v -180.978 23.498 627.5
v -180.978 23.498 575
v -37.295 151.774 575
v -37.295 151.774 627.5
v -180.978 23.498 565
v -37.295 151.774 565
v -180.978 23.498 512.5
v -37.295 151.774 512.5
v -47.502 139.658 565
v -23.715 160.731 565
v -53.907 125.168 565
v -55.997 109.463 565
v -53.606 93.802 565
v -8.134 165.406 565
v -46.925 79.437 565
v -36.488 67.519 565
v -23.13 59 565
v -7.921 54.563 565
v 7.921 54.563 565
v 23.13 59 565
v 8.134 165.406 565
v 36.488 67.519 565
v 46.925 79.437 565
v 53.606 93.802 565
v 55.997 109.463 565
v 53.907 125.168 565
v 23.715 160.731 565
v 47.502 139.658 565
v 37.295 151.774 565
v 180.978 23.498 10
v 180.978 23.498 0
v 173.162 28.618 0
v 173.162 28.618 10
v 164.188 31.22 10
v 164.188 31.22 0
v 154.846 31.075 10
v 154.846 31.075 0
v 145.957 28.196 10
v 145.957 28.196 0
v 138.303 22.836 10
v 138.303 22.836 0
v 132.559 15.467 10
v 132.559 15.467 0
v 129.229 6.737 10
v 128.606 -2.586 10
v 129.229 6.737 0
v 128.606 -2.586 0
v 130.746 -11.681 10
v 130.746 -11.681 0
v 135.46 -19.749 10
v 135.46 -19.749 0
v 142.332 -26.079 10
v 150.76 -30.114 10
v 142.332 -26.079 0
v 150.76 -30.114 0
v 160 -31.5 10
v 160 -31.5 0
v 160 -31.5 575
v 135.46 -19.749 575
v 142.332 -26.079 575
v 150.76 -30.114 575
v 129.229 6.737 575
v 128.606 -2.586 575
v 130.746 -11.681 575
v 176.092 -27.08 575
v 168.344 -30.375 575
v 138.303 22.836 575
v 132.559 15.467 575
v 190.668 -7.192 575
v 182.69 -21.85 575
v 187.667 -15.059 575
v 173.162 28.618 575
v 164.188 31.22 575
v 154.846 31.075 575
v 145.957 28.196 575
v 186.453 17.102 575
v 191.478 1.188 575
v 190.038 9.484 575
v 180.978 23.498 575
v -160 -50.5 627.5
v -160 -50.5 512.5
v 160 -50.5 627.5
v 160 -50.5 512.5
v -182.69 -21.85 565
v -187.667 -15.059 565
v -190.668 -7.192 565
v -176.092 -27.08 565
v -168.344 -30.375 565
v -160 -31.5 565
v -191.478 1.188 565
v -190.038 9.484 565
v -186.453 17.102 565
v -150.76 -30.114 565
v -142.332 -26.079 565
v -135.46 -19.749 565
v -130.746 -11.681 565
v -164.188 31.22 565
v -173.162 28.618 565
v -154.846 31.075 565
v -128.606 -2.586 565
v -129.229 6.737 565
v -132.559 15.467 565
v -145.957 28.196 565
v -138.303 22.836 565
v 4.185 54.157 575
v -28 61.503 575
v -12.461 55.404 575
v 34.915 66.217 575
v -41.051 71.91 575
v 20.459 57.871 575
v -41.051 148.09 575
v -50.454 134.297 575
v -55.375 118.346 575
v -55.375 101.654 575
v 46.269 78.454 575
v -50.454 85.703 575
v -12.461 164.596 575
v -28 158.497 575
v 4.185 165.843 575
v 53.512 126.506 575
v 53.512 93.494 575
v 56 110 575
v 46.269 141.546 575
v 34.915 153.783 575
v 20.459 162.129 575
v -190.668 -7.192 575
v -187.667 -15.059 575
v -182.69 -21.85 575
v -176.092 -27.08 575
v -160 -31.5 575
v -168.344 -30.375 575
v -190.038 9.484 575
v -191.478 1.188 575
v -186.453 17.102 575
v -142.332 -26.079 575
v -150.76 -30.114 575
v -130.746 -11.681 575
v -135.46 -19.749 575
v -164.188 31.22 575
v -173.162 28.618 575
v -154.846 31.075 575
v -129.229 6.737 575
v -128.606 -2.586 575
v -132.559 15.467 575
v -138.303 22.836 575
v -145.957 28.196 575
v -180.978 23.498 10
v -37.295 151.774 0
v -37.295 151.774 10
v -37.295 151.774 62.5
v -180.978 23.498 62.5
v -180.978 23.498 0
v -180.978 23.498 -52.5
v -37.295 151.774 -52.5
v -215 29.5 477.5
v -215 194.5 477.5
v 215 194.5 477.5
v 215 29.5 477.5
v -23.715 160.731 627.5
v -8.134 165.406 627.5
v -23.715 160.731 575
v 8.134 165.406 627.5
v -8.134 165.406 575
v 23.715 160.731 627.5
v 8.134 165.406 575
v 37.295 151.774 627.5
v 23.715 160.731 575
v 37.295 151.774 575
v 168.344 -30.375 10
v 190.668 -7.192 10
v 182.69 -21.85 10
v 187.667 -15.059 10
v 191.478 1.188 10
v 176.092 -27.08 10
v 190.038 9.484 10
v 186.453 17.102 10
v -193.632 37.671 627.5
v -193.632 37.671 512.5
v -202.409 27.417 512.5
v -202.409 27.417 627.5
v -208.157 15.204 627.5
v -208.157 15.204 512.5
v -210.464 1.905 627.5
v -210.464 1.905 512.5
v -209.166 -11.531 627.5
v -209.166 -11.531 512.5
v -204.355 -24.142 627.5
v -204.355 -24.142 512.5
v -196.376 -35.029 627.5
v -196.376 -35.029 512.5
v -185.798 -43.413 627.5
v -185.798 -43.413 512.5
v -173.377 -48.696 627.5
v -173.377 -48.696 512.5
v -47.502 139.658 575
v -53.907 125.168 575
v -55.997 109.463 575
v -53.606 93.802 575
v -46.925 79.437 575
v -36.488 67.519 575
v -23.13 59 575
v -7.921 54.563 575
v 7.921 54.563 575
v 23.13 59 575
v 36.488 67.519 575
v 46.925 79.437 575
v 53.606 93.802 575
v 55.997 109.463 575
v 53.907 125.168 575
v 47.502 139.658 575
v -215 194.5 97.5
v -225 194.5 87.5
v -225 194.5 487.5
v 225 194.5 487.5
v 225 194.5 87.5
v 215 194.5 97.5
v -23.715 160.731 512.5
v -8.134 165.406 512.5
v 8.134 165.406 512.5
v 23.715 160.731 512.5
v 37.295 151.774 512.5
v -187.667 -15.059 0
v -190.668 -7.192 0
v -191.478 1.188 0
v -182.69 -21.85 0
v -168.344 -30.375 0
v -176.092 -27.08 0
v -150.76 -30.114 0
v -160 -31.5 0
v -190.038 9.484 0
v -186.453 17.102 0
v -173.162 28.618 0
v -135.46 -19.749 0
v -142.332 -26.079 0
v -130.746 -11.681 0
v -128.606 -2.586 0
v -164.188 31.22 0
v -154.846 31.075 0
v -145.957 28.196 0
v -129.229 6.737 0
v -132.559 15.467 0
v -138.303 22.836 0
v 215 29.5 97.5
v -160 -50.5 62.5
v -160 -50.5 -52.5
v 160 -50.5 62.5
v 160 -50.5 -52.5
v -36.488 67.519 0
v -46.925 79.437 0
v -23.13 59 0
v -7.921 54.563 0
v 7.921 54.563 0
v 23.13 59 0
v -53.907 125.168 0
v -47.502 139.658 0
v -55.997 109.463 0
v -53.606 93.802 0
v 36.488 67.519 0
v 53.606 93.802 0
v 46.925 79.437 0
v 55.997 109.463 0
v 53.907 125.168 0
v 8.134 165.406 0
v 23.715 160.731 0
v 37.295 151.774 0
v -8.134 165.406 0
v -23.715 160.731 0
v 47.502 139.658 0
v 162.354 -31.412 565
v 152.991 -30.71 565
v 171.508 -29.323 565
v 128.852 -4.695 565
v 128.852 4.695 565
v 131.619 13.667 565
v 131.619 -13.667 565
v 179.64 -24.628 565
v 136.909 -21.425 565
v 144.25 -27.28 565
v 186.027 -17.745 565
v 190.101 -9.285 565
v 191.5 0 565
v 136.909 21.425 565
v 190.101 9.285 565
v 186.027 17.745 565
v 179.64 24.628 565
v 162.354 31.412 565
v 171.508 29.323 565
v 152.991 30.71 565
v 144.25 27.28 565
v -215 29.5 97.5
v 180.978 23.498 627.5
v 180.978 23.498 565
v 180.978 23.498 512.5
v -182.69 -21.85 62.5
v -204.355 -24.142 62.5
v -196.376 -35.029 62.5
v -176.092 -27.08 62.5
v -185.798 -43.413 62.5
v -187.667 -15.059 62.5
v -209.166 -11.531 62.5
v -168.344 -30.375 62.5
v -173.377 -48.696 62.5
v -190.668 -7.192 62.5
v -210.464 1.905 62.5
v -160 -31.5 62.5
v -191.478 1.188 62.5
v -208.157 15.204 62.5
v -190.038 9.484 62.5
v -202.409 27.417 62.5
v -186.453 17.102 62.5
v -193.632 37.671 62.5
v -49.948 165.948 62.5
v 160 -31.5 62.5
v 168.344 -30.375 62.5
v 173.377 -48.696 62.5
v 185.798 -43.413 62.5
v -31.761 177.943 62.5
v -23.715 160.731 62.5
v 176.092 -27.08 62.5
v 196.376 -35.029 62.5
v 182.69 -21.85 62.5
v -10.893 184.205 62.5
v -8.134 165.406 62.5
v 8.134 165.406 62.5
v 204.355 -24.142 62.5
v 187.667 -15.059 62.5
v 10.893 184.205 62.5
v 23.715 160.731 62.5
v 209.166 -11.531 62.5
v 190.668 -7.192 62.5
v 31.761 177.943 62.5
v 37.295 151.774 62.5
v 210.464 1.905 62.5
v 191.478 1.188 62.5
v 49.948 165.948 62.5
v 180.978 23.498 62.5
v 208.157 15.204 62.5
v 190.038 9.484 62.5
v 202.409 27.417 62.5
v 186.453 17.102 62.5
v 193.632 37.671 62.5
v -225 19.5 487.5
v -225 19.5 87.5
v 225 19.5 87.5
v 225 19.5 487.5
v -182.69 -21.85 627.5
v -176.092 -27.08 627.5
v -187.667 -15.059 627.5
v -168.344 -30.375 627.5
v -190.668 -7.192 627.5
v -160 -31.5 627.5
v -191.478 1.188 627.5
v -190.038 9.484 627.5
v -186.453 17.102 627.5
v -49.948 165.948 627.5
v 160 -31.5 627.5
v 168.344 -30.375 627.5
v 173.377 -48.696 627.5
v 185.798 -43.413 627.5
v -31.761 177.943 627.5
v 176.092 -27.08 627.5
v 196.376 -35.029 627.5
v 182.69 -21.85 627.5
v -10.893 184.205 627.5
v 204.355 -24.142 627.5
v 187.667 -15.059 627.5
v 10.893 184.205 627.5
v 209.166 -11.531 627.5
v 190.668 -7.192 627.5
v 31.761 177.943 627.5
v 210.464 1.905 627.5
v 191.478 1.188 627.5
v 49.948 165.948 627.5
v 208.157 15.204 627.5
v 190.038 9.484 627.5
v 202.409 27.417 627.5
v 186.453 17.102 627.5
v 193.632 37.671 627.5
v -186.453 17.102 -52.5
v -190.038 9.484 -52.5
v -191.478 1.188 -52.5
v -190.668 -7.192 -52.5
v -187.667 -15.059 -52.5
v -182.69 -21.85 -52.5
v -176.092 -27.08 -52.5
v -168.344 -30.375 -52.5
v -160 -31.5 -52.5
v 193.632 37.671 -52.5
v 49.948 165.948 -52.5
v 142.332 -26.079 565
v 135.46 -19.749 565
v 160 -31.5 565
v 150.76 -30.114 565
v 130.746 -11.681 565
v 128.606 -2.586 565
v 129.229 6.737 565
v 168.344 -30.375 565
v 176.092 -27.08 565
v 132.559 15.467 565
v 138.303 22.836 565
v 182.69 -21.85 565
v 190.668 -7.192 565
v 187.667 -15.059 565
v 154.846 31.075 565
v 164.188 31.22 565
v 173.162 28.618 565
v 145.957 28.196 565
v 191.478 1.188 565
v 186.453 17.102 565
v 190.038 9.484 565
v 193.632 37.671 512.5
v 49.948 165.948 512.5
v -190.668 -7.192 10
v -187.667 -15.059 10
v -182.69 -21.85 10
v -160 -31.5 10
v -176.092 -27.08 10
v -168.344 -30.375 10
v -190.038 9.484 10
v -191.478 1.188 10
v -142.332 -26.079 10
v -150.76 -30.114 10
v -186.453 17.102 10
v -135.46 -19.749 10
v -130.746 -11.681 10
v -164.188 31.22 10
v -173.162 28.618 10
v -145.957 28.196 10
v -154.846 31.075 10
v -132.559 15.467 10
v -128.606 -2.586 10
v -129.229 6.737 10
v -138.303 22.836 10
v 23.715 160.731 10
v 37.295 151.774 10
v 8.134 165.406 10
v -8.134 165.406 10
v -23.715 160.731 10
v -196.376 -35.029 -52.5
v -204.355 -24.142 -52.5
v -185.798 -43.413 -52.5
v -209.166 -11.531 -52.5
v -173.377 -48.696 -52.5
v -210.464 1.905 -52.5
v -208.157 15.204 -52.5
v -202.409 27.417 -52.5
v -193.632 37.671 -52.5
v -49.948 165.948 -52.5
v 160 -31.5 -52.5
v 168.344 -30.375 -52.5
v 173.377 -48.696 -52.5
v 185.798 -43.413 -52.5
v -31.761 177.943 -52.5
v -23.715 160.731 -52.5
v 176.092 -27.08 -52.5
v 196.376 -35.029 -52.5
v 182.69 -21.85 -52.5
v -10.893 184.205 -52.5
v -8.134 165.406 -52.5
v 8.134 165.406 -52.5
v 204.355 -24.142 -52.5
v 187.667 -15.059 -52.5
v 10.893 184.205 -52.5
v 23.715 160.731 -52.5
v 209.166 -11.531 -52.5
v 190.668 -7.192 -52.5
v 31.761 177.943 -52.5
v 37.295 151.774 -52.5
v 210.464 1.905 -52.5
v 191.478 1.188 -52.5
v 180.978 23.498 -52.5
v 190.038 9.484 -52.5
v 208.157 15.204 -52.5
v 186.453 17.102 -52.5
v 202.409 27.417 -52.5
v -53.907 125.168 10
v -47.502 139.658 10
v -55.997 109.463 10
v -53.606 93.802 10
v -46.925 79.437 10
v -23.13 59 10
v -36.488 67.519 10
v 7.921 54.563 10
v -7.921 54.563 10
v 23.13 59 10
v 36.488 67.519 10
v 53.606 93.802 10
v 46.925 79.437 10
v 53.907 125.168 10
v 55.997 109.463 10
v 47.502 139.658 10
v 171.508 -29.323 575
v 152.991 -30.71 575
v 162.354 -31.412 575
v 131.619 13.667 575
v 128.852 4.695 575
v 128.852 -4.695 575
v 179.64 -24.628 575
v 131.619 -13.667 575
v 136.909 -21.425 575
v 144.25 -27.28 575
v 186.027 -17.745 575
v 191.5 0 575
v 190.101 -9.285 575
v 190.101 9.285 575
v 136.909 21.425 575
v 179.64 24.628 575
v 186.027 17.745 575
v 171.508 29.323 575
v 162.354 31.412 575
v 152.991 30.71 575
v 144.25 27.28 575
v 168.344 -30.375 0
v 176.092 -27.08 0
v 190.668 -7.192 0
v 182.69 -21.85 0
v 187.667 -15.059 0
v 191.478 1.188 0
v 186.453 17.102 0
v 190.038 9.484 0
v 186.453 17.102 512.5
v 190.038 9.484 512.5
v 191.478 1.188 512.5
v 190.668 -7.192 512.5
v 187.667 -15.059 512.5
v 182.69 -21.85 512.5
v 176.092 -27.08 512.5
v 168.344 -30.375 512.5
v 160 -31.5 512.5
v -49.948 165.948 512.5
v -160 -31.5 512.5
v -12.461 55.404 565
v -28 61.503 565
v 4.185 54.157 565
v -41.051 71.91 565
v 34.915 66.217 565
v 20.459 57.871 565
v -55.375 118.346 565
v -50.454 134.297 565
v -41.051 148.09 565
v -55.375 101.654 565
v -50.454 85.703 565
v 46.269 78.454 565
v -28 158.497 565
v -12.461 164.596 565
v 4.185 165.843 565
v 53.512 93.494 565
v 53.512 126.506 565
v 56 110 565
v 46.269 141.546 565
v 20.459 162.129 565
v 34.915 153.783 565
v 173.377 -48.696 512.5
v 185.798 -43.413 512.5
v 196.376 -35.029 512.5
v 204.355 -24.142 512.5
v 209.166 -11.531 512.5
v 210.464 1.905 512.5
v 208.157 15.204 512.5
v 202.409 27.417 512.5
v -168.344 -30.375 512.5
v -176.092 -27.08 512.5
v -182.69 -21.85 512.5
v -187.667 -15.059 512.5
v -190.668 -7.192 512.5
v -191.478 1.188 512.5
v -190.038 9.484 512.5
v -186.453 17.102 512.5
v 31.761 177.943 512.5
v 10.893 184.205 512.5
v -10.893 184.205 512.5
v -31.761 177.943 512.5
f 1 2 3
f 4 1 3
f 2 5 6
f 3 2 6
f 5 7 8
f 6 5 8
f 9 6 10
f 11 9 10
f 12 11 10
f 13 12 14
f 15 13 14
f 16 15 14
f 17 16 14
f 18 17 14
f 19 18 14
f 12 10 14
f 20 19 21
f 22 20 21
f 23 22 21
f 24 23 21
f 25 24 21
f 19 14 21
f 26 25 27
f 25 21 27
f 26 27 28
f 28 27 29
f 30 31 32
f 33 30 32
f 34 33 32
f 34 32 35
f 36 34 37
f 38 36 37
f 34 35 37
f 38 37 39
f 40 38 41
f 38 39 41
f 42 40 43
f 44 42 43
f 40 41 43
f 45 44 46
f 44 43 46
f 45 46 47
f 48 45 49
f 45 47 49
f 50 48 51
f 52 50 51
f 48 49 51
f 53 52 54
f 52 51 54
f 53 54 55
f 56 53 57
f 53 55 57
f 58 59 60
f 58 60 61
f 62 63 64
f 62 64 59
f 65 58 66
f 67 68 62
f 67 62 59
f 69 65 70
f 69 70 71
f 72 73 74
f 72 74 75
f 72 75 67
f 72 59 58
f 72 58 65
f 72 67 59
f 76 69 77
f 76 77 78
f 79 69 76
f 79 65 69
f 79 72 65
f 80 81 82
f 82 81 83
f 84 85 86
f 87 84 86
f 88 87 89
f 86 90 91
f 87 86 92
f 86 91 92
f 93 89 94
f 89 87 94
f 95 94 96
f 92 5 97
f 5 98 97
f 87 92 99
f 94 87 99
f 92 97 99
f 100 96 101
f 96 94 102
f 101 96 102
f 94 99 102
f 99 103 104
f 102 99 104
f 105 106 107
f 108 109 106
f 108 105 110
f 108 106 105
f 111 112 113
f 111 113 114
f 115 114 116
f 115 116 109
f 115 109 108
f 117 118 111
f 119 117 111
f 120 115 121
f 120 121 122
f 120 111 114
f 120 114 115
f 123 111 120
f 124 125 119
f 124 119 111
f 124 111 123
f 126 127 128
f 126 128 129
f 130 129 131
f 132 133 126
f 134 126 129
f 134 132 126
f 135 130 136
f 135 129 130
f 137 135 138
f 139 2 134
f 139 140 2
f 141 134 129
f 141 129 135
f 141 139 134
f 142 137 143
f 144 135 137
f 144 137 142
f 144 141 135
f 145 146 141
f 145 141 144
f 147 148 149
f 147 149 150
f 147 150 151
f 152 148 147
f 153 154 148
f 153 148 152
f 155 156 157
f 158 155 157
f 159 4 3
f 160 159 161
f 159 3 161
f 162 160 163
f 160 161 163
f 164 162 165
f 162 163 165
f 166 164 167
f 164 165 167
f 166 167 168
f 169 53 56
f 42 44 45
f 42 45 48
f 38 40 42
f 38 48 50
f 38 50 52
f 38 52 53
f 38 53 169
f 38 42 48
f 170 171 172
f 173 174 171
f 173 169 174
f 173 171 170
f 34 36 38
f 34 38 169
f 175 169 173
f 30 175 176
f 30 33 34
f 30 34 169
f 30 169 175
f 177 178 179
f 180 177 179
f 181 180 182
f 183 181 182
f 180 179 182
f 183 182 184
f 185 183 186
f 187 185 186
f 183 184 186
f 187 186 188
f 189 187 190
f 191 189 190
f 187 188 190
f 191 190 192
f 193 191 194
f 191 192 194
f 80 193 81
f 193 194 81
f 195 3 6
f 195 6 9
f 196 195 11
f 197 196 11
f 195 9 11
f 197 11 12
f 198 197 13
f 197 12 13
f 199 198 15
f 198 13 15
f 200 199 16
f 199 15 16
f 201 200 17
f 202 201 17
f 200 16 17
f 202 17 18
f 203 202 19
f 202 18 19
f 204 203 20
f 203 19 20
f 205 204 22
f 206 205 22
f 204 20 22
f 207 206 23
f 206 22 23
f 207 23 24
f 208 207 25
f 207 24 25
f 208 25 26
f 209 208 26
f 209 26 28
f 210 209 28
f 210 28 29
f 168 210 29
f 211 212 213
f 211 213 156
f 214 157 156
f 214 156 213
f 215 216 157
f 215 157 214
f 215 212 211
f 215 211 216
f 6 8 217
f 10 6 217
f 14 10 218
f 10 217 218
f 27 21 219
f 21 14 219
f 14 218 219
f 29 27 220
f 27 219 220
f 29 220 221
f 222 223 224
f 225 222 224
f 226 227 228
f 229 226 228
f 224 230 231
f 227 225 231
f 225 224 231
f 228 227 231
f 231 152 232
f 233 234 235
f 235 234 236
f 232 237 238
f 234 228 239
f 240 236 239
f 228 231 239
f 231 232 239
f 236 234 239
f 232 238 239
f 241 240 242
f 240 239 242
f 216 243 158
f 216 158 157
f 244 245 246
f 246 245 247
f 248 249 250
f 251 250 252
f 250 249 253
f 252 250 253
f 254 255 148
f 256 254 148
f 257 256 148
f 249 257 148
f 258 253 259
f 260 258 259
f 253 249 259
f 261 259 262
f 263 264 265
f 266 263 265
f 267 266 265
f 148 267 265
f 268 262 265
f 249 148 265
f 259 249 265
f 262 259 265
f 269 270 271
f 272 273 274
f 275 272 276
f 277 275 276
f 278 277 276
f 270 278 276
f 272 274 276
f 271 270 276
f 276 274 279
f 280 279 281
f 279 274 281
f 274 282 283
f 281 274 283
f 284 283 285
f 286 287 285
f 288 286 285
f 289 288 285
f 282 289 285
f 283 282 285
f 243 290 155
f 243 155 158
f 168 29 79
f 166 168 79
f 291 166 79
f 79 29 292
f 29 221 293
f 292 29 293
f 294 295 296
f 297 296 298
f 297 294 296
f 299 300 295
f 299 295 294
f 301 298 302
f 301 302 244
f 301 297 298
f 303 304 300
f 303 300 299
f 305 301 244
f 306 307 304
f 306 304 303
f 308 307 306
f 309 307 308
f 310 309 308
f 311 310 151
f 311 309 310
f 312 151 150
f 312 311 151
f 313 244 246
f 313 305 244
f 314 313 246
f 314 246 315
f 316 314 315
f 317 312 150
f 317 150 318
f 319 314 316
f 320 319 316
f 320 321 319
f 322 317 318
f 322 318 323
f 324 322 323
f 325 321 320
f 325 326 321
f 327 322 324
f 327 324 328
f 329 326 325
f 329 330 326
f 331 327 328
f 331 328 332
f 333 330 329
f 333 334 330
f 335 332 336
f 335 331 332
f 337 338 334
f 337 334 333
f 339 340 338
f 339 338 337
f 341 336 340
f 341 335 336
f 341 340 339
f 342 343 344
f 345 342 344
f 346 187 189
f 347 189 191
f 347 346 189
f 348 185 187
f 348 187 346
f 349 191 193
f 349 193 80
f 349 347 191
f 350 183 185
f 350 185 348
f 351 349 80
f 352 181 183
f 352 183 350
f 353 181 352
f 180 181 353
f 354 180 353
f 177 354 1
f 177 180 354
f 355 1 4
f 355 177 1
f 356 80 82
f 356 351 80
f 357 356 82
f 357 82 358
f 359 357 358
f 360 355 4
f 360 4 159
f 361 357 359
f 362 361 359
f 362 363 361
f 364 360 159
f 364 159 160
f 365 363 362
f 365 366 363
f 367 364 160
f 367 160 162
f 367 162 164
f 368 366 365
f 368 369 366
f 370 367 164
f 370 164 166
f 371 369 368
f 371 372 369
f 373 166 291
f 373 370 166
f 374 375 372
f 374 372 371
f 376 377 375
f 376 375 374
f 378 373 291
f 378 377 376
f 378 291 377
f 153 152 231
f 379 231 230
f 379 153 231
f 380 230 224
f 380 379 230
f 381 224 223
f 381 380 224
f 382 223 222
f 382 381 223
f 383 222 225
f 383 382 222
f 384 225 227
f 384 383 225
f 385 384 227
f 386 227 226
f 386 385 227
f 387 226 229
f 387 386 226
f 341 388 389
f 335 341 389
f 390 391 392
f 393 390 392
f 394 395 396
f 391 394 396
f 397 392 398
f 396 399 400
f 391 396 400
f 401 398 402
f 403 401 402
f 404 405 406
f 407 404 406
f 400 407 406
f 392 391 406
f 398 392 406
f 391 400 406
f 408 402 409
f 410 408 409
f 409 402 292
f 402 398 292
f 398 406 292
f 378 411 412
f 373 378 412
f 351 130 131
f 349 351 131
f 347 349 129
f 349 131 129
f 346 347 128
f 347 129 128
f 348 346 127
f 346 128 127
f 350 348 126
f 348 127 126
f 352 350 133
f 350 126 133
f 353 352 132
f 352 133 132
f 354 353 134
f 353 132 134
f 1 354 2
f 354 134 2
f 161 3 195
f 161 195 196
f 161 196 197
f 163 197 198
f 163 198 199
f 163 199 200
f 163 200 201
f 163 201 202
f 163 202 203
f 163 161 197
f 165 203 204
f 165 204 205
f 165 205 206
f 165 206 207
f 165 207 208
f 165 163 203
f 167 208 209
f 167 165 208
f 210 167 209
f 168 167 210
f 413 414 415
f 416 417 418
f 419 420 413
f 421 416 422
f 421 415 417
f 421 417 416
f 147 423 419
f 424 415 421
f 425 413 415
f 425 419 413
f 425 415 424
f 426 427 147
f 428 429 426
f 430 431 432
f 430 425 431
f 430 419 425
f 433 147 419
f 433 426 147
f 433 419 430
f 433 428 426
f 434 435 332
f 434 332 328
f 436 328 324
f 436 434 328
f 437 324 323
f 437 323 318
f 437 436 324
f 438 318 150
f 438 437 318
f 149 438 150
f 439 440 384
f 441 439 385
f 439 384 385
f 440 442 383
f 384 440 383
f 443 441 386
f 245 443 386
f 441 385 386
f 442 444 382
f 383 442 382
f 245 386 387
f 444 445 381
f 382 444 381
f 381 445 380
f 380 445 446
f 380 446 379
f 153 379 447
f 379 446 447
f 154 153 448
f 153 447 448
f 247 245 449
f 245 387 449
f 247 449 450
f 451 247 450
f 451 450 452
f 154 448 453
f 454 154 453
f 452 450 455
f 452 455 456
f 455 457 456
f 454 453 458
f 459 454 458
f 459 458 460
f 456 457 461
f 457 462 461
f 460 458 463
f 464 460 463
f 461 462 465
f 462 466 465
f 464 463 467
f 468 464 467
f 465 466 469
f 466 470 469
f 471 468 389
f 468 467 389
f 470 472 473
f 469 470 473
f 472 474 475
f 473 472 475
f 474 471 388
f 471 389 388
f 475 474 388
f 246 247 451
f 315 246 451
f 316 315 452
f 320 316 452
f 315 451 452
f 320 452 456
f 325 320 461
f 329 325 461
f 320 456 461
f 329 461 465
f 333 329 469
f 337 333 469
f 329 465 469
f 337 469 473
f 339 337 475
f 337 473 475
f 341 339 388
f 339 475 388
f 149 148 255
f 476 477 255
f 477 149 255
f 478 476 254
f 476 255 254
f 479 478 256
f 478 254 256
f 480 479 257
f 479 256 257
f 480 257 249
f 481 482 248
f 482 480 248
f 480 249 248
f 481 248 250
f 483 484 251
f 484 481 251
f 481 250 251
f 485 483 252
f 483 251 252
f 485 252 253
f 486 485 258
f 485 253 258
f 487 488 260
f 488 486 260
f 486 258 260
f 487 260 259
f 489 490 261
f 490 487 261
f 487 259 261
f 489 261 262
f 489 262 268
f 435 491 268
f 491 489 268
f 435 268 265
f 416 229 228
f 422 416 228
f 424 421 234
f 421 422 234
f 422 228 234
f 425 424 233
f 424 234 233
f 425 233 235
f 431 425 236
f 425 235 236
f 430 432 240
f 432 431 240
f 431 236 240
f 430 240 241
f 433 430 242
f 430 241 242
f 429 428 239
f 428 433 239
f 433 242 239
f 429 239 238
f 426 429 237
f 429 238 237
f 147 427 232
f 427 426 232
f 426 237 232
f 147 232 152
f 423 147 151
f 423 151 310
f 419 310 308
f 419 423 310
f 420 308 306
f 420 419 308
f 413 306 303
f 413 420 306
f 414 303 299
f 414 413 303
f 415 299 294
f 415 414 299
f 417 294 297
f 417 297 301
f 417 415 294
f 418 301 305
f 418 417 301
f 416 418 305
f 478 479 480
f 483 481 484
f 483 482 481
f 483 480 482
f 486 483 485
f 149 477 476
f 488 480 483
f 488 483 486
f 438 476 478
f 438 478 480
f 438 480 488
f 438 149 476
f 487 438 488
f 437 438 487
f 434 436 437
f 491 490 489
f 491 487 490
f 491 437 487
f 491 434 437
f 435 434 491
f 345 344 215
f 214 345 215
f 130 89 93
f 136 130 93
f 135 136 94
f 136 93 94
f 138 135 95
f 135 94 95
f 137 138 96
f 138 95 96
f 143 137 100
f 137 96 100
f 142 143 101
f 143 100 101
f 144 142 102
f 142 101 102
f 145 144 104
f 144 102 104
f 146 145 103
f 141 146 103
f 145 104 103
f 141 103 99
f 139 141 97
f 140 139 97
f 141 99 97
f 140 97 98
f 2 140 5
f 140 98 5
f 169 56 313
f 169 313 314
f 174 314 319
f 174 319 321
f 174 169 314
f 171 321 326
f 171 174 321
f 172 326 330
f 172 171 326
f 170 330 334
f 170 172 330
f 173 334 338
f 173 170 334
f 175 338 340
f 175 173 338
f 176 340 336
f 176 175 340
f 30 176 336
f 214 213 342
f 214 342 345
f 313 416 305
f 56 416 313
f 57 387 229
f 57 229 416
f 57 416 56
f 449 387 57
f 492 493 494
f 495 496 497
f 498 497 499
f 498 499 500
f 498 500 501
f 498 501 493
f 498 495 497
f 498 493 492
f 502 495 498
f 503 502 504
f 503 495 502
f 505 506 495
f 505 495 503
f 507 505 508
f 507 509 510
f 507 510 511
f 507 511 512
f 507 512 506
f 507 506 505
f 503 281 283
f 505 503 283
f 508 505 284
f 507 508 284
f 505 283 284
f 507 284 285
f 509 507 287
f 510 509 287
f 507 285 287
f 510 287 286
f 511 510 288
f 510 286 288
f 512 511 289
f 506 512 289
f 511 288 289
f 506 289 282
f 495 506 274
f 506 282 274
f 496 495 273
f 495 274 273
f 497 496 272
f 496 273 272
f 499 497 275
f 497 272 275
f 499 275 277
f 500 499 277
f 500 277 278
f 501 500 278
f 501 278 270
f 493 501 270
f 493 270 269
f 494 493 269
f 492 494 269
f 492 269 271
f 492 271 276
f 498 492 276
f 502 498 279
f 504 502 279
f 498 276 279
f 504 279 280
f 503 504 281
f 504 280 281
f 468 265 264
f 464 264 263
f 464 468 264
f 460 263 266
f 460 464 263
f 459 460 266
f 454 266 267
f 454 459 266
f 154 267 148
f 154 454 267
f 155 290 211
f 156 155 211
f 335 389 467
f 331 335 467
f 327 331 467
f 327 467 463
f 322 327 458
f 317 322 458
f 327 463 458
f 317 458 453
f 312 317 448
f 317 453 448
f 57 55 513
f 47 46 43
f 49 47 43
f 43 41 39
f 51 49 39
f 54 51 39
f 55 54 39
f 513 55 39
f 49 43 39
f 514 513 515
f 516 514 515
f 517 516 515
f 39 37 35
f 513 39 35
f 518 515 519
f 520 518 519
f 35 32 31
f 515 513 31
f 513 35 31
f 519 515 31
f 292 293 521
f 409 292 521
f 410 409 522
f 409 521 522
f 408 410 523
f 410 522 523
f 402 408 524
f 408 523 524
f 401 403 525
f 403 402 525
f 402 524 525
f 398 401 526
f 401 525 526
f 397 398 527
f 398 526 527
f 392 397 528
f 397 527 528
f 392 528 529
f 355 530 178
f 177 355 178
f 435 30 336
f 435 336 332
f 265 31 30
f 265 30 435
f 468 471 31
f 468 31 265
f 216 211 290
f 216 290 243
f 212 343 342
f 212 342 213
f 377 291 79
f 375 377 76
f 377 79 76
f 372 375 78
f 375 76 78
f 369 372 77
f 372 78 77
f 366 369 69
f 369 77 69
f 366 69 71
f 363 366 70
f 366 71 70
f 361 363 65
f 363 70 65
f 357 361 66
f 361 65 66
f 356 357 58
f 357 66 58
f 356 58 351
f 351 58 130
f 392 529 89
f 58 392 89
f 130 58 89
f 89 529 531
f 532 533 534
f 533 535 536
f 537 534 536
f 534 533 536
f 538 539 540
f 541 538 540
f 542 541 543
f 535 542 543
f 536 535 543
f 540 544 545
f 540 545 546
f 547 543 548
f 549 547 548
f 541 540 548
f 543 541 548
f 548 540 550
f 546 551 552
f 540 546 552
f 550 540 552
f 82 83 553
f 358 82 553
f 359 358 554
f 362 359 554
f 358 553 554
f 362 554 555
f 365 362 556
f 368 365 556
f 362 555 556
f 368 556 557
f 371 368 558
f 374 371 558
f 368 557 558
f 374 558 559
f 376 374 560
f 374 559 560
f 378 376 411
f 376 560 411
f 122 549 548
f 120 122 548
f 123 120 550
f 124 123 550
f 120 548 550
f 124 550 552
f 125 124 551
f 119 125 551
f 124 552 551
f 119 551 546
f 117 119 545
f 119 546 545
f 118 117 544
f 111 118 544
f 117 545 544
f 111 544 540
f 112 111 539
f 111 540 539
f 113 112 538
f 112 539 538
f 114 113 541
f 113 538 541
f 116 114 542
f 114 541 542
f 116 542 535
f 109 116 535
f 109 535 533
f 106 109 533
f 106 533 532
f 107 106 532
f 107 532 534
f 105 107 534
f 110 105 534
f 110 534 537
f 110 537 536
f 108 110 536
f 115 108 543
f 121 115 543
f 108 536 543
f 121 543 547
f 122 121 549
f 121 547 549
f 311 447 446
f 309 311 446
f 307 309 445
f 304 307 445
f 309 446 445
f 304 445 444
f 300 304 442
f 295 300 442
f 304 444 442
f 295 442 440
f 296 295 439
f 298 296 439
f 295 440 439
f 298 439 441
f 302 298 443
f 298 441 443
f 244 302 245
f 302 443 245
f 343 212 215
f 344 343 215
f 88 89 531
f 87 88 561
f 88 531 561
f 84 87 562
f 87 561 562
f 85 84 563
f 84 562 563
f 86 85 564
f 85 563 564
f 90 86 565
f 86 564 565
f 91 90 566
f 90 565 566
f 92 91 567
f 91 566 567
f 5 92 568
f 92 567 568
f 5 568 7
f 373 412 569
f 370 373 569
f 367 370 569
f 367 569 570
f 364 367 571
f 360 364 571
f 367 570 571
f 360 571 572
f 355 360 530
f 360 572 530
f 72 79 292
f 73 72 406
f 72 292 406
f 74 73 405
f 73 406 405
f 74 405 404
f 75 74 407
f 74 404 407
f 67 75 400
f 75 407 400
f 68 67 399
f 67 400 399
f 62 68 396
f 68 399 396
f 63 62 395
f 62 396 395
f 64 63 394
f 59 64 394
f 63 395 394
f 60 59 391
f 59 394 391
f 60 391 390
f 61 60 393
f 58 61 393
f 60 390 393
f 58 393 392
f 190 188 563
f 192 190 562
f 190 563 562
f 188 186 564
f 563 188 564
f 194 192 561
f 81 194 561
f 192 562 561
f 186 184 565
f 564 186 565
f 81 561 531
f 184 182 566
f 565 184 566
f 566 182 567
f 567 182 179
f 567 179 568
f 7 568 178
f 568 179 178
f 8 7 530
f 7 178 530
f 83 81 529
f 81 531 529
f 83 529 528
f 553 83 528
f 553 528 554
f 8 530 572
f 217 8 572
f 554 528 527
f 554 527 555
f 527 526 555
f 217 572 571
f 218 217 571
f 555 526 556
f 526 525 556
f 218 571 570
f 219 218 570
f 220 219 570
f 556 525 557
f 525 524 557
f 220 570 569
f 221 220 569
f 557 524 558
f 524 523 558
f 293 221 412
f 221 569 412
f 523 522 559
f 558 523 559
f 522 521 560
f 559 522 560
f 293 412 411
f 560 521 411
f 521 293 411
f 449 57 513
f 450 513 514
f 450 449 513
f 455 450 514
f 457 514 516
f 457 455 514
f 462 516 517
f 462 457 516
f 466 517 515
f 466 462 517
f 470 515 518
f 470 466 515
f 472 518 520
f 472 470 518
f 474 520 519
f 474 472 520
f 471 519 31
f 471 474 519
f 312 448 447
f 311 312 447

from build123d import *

# Parameters (mm, degrees)
SCHIZZO1_R                     = 31.5
ESTRUSIONE_ESTRUSIONE1_DEPTH   = 10
ESTRUSIONE_ESTRUSIONE1_2_DEPTH = 10
SCHIZZO1_R_2                   = 56
ESTRUSIONE_ESTRUSIONE1_3_DEPTH = 10
ESTRUSIONE_SOTTILE1_START      = -62.5
ESTRUSIONE_SOTTILE1_DEPTH      = 115
SCHIZZO3_W                     = 450
SCHIZZO3_H                     = 175
ESTRUSIONE_ESTRUSIONE2_DEPTH   = 400
SVUOTA1_T                      = -10
RIPETIZIONE_START              = 565
RIPETIZIONE_A_L2_OUTLINE_R     = 56
RIPETIZIONE_A_L2_DEPTH         = 10
RIPETIZIONE_A_L2_2_OUTLINE_R   = 31.5
RIPETIZIONE_A_L2_2_DEPTH       = 10
RIPETIZIONE_START_2            = 512.5
RIPETIZIONE_A_L2_3_DEPTH       = 115
RIPETIZIONE_A_L2_4_DEPTH       = 10


# Read off the part's stored shape, not the designer's step: Ripetizione a L2
with BuildPart() as part:
    # Schizzo1 → Estrusione-Estrusione1 (new body)
    with BuildSketch(Plane.XY):
        with Locations((-160, 0)):
            Circle(SCHIZZO1_R)
    extrude(amount=ESTRUSIONE_ESTRUSIONE1_DEPTH)



with BuildPart() as body_2:
    # Schizzo1 → Estrusione-Estrusione1 2 (new body)
    with BuildSketch(Plane.XY):
        with Locations((160, 0)):
            Circle(SCHIZZO1_R)
    extrude(amount=ESTRUSIONE_ESTRUSIONE1_2_DEPTH)


with BuildPart() as body_3:
    # Schizzo1 → Estrusione-Estrusione1 3 (new body)
    with BuildSketch(Plane.XY):
        with Locations((0, 110)):
            Circle(SCHIZZO1_R_2)
    extrude(amount=ESTRUSIONE_ESTRUSIONE1_3_DEPTH)


with BuildPart() as part_1:
    add(part.part)

    add(body_2.part)  # Estrusione-Sottile1 merges body 2

    add(body_3.part)  # Estrusione-Sottile1 merges body 3
    # Schizzo2 → Estrusione-Sottile1 (add)
    with BuildSketch(Plane.XY.offset(10).offset(ESTRUSIONE_SOTTILE1_START)):
        with BuildLine():
            Line((193.631961771, 37.671489849), (49.948458076, 165.947757201))
            ThreePointArc((49.948458076, 165.947757201), (0, 185), (-49.948458076, 165.947757201))
            Line((-49.948458076, 165.947757201), (-193.631961771, 37.671489849))
            ThreePointArc((-193.631961771, 37.671489849), (-207.184002784, -17.997774343), (-160, -50.5))
            Line((-160, -50.5), (160, -50.5))
            ThreePointArc((160, -50.5), (207.184002784, -17.997774343), (193.631961771, 37.671489849))
        make_face()
        with BuildLine():
            Line((180.978352392, 23.498058025), (37.294848697, 151.774325377))
            ThreePointArc((37.294848697, 151.774325377), (0, 166), (-37.294848697, 151.774325377))
            Line((-37.294848697, 151.774325377), (-180.978352392, 23.498058025))
            ThreePointArc((-180.978352392, 23.498058025), (-189.431605697, -11.226334491), (-160, -31.5))
            Line((-160, -31.5), (160, -31.5))
            ThreePointArc((160, -31.5), (189.431605697, -11.226334491), (180.978352392, 23.498058025))
        make_face(mode=Mode.SUBTRACT)
    extrude(amount=ESTRUSIONE_SOTTILE1_DEPTH)


with BuildPart() as body_2_2:
    # Schizzo3 → Estrusione-Estrusione2 (new body)
    with BuildSketch(Plane.XY.offset(87.5)):
        with Locations((0, 107)):
            Rectangle(SCHIZZO3_W, SCHIZZO3_H)
    extrude(amount=ESTRUSIONE_ESTRUSIONE2_DEPTH)

    # Svuota1
    svuota1_openings = [body_2_2.faces().sort_by_distance(p)[0] for p in [
        (0, 194.5, 287.5),
    ]]
    offset(amount=SVUOTA1_T, openings=svuota1_openings, kind=Kind.INTERSECTION)


with BuildPart() as body_3_2:
    # Ripetizione a L2 outline → Ripetizione a L2 (new body)
    with BuildSketch(Plane.XY.offset(RIPETIZIONE_START)):
        with Locations((0, 110)):
            Circle(RIPETIZIONE_A_L2_OUTLINE_R)
    extrude(amount=RIPETIZIONE_A_L2_DEPTH)


with BuildPart() as body_4:
    # Ripetizione a L2 2 outline → Ripetizione a L2 2 (new body)
    with BuildSketch(Plane.XY.offset(RIPETIZIONE_START)):
        with Locations((160, 0)):
            Circle(RIPETIZIONE_A_L2_2_OUTLINE_R)
    extrude(amount=RIPETIZIONE_A_L2_2_DEPTH)


with BuildPart() as body_5:
    # Ripetizione a L2 3 outline → Ripetizione a L2 3 (new body)
    with BuildSketch(Plane.XY.offset(RIPETIZIONE_START_2)):
        with BuildLine():
            ThreePointArc((49.948458076, 165.947757201), (0, 185), (-49.948458076, 165.947757201))
            Line((-49.948458076, 165.947757201), (-193.631961771, 37.671489849))
            ThreePointArc((-193.631961771, 37.671489849), (-207.184002784, -17.997774343), (-160, -50.5))
            Line((-160, -50.5), (160, -50.5))
            ThreePointArc((160, -50.5), (207.184002784, -17.997774343), (193.631961771, 37.671489849))
            Line((193.631961771, 37.671489849), (49.948458076, 165.947757201))
        make_face()
        with BuildLine():
            Line((-180.978352392, 23.498058025), (-37.294848697, 151.774325377))
            ThreePointArc((-37.294848697, 151.774325377), (0, 166), (37.294848697, 151.774325377))
            Line((37.294848697, 151.774325377), (180.978352392, 23.498058025))
            ThreePointArc((180.978352392, 23.498058025), (189.431605697, -11.226334491), (160, -31.5))
            Line((160, -31.5), (-160, -31.5))
            ThreePointArc((-160, -31.5), (-189.431605697, -11.226334491), (-180.978352392, 23.498058025))
        make_face(mode=Mode.SUBTRACT)
    extrude(amount=RIPETIZIONE_A_L2_3_DEPTH)

    # Ripetizione a L2 4 outline → Ripetizione a L2 4 (add)
    with BuildSketch(Plane.XY.offset(RIPETIZIONE_START)):
        with BuildLine():
            ThreePointArc((37.294848697, 151.774325377), (0, 166), (-37.294848697, 151.774325377))
            ThreePointArc((-37.294848697, 151.774325377), (0, 54), (37.294848697, 151.774325377))
        make_face()
        with BuildLine():
            ThreePointArc((-160, -31.5), (-130.568394303, 11.226334492), (-180.978352392, 23.498058025))
            ThreePointArc((-180.978352392, 23.498058025), (-189.431605697, -11.226334491), (-160, -31.5))
        make_face()
        with BuildLine():
            ThreePointArc((160, -31.5), (189.431605697, -11.226334491), (180.978352392, 23.498058025))
            ThreePointArc((180.978352392, 23.498058025), (130.568394303, 11.226334492), (160, -31.5))
        make_face()
    extrude(amount=RIPETIZIONE_A_L2_4_DEPTH)


solid = Compound([part_1.part, body_2_2.part, body_3_2.part, body_4.part, body_5.part])
